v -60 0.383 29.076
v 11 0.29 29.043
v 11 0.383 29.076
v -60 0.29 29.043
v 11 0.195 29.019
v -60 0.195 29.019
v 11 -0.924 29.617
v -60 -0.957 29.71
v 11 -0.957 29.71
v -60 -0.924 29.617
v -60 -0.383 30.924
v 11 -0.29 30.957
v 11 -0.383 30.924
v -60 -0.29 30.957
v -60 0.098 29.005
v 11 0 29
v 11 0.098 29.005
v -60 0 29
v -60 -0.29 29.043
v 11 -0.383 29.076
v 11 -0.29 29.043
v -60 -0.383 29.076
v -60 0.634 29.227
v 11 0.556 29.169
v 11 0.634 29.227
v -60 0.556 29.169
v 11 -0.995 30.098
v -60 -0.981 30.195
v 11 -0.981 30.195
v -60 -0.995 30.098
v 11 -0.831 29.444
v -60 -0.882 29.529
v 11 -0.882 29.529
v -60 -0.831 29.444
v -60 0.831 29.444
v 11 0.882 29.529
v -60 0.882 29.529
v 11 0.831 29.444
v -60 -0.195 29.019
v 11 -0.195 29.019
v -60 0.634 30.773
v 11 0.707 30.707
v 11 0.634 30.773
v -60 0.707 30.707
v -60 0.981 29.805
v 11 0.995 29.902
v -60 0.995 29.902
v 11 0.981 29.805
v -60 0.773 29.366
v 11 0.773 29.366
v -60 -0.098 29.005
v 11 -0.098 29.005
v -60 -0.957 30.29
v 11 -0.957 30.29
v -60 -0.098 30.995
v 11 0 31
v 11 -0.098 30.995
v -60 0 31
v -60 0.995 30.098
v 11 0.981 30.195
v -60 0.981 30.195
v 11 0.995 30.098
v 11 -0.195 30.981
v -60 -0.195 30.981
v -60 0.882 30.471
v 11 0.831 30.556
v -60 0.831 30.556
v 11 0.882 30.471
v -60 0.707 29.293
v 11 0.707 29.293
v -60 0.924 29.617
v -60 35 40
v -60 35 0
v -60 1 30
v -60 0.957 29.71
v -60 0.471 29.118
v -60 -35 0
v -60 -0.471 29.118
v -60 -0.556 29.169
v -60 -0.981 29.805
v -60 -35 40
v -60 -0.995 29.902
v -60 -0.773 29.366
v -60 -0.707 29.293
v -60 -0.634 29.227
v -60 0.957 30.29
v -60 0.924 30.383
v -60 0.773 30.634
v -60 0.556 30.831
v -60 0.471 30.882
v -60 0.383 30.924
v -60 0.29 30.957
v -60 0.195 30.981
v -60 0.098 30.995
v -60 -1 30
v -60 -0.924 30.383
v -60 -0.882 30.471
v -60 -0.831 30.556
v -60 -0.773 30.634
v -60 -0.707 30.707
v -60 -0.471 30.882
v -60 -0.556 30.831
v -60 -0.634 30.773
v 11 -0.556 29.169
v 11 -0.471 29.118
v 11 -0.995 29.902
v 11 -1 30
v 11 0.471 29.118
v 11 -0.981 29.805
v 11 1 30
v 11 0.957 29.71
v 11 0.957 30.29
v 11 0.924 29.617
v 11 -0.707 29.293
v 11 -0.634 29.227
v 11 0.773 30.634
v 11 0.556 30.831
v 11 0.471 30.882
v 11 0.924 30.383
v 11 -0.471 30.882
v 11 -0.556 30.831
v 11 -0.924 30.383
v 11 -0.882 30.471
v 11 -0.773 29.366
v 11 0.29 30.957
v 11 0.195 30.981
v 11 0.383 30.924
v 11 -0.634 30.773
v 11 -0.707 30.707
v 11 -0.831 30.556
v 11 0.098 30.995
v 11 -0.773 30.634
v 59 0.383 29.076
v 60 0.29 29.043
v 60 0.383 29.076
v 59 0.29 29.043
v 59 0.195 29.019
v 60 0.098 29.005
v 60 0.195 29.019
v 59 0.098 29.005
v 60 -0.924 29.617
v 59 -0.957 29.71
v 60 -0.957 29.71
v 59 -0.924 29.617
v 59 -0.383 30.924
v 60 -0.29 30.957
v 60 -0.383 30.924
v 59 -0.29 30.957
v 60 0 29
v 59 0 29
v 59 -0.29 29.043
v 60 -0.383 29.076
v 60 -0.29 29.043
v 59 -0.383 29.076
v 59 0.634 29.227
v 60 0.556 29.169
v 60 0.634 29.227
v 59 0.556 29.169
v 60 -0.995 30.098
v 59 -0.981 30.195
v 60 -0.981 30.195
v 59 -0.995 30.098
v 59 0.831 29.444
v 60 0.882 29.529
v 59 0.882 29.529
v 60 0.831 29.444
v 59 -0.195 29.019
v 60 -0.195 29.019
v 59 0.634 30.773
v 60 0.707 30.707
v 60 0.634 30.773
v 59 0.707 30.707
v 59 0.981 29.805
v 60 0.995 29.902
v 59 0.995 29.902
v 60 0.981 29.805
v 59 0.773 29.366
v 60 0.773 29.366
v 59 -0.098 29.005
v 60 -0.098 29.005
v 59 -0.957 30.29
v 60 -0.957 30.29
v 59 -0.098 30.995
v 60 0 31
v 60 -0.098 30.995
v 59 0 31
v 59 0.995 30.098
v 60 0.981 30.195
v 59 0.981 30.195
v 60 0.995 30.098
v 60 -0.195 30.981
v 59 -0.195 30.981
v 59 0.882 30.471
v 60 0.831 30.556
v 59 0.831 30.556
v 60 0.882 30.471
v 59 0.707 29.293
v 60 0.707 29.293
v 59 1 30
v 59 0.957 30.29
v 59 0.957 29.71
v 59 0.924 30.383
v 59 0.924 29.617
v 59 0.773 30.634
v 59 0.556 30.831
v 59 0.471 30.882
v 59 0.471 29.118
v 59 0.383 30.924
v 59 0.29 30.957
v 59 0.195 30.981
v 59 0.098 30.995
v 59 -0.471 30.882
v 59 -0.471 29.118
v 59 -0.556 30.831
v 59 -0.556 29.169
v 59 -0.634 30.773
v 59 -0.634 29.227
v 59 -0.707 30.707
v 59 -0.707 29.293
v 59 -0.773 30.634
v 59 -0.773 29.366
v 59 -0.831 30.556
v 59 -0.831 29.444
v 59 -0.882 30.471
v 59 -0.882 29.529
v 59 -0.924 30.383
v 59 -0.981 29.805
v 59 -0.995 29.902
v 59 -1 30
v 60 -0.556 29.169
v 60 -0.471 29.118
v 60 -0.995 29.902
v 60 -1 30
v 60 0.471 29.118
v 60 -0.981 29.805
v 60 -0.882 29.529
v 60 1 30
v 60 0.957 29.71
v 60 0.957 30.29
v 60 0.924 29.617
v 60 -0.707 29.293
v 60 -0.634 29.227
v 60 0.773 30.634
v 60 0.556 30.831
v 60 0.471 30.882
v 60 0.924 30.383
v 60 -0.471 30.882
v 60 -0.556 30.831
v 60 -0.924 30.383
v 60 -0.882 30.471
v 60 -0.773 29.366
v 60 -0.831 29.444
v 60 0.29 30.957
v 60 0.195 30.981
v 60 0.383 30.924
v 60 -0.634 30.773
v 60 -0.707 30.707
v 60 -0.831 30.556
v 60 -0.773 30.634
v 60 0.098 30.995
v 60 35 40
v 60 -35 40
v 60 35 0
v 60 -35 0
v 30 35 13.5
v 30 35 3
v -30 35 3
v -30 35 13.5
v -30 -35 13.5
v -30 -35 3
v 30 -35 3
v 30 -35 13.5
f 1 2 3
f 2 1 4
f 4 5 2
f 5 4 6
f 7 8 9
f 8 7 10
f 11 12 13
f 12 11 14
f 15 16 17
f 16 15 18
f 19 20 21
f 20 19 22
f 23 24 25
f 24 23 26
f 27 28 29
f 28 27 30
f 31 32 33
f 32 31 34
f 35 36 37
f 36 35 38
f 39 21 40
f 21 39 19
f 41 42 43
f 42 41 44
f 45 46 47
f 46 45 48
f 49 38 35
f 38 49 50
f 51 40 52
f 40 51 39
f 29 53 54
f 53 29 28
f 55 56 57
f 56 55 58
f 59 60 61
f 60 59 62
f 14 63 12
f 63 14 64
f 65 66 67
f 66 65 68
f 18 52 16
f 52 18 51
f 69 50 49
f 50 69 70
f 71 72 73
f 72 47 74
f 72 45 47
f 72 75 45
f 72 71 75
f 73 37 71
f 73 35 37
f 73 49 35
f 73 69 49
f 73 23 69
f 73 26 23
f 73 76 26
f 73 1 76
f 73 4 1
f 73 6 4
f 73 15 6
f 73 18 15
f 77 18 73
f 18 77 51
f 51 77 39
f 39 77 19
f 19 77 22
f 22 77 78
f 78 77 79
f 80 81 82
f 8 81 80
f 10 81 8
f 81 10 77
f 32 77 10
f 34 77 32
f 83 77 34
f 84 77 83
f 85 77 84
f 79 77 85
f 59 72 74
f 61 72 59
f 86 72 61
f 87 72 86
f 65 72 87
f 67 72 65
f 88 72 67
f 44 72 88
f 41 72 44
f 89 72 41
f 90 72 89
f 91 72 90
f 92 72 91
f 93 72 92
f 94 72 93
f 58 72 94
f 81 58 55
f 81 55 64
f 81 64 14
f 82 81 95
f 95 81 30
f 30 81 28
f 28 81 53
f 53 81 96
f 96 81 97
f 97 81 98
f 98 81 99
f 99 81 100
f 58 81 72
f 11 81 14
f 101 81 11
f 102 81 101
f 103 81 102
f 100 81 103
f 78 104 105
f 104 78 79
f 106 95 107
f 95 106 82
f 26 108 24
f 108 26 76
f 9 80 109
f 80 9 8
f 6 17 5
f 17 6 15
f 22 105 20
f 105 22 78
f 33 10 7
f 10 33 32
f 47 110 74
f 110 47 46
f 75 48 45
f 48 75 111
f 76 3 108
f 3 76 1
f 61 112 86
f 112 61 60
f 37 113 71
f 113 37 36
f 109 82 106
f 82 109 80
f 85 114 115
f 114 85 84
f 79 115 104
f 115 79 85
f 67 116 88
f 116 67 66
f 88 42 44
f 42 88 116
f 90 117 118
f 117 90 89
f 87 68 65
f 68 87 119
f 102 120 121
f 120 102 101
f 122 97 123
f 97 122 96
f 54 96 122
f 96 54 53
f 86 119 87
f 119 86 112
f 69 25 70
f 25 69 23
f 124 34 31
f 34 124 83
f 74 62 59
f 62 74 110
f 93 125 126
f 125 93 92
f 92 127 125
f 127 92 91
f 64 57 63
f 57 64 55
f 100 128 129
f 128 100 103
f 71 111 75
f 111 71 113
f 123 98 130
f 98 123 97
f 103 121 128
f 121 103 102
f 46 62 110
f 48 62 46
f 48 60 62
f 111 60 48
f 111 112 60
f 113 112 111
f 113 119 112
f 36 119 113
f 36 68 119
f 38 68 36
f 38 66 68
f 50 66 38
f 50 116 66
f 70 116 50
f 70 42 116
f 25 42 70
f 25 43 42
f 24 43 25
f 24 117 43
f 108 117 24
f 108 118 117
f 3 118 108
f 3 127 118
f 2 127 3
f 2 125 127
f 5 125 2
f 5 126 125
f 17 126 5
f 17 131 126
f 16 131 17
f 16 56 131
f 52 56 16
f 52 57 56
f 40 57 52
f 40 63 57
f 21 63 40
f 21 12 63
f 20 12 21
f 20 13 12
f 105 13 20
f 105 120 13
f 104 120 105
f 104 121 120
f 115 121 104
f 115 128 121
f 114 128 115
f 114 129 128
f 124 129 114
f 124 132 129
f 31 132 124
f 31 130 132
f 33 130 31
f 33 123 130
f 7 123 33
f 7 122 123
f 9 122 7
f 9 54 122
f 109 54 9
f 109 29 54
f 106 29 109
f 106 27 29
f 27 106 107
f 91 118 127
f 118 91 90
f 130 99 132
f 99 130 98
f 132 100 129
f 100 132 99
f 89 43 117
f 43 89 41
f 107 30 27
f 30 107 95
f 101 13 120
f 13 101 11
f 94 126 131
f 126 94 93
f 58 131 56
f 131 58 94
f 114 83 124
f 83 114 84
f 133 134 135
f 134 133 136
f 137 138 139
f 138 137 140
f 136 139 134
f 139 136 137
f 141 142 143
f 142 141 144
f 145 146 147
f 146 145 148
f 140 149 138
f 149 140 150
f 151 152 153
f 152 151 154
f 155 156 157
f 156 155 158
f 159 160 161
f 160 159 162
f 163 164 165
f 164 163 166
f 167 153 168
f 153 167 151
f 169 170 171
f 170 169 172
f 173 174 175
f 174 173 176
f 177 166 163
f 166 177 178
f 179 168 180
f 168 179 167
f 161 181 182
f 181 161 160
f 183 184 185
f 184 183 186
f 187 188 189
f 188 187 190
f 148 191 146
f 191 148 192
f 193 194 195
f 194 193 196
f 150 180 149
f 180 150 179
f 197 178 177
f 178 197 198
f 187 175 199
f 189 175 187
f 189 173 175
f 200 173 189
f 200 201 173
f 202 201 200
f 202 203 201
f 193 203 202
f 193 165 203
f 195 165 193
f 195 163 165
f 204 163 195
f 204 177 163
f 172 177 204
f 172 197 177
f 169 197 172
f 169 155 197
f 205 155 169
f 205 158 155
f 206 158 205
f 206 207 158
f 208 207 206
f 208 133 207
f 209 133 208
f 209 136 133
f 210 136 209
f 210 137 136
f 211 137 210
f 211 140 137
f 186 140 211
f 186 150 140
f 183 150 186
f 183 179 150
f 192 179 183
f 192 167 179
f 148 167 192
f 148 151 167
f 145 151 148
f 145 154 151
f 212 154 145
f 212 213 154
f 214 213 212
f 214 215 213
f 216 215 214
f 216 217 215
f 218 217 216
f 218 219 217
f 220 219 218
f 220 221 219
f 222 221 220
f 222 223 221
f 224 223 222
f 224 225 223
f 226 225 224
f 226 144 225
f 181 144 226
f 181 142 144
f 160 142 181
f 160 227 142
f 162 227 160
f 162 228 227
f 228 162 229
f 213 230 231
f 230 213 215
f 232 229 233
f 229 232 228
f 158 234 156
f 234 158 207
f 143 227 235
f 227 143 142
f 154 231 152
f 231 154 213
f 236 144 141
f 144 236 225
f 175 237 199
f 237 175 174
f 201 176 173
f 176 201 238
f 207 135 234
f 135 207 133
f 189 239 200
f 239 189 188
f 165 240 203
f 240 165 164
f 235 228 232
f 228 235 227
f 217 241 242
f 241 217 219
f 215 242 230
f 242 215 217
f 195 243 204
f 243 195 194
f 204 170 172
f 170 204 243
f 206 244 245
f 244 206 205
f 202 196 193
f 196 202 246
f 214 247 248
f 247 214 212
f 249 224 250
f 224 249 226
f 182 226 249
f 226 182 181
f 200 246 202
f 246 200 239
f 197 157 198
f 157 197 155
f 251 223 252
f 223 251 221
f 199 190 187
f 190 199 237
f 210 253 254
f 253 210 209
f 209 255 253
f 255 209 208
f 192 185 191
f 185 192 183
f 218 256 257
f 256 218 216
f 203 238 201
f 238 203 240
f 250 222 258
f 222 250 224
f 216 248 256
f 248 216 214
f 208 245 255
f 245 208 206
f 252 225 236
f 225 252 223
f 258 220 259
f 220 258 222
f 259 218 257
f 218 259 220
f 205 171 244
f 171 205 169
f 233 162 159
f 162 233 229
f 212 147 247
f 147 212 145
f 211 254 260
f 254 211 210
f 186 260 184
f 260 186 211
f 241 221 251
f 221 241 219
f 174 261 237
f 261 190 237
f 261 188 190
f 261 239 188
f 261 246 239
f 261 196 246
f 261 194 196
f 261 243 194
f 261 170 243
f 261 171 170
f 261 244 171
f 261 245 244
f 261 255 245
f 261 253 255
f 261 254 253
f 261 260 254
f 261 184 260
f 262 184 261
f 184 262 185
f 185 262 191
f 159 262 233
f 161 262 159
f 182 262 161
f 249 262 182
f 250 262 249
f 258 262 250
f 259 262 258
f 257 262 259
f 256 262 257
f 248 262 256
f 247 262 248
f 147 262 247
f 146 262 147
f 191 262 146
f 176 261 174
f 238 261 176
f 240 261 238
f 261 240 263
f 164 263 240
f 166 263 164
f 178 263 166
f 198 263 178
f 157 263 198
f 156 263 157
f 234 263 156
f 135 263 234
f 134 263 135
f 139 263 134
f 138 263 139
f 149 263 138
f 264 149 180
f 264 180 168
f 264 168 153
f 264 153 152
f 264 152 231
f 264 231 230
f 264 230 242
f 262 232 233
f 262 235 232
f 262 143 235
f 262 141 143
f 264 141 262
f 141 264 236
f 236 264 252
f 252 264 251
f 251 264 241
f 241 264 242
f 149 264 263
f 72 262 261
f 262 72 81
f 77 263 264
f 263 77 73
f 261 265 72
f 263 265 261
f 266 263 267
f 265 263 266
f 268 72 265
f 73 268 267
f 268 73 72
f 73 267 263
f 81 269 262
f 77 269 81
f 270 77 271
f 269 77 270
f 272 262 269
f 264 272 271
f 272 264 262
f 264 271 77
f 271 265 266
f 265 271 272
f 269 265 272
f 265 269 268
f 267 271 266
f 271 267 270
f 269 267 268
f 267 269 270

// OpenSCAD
// Mini horizontal gel-electrophoresis buffer tank
// Print orientation: base on XY plane, open top, builds up +Z

// ---- Tank dimensions ----
outer_x = 120;   // outer length along X
outer_y = 70;    // outer width along Y
height  = 40;    // outer height along Z
wall    = 3;     // wall thickness
floor   = 3;     // floor thickness

// ---- Platform dimensions ----
plat_len   = 60;  // platform length along X (centred)
plat_top_z = 13;  // platform top height above inner floor

// ---- Electrode holes ----
hole_d = 2;       // hole diameter
hole_y = 0;       // hole Y position
hole_z = 30;      // hole Z position

// ---- Misc ----
eps = 0.5;        // cutter overshoot past faces
$fn = 64;

// Derived
inner_h = height - floor;  // inner floor height above z=0

difference() {
    // Tank body
    translate([-outer_x/2, -outer_y/2, 0])
        cube([outer_x, outer_y, height]);

    // Raised platform (through full inner width Y)
    translate([-plat_len/2, -outer_y/2, floor])
        cube([plat_len, outer_y, plat_top_z - floor + eps]);

    // Electrode holes through end walls along X
    for (sx = [-1, 1])
        translate([sx > 0 ? outer_x/2 - 1 : -outer_x/2, hole_y, hole_z])
            rotate([0, 90, 0])
                cylinder(d = hole_d, h = outer_y + 2*eps, $fn = 64);
}
